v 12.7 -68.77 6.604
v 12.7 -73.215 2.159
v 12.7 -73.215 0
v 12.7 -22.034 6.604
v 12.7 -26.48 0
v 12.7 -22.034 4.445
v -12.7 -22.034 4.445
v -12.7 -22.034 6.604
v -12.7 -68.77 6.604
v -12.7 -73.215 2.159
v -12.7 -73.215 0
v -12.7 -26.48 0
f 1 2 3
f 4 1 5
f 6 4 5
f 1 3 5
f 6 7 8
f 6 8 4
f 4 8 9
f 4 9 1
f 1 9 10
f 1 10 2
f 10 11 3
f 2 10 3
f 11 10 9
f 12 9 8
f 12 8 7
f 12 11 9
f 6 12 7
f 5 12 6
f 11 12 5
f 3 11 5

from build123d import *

# Parameters (mm, degrees)
SKETCH1_W           = 25.4
SKETCH1_H           = 51.181
BOSS_EXTRUDE1_DEPTH = 6.604
CHAMFER1_SIZE       = 4.445


with BuildPart() as part:
    # Sketch1 → Boss-Extrude1 (new body)
    with BuildSketch(Plane.XY):
        with Locations((0, -47.625)):
            Rectangle(SKETCH1_W, SKETCH1_H)
    extrude(amount=BOSS_EXTRUDE1_DEPTH)

    # Chamfer1
    chamfer1_edges = [part.edges().sort_by_distance(p)[0] for p in [
        (0, -73.2155, 6.604),
        (0, -22.0345, 0),
    ]]
    chamfer(chamfer1_edges, length=CHAMFER1_SIZE)


solid = part.part
